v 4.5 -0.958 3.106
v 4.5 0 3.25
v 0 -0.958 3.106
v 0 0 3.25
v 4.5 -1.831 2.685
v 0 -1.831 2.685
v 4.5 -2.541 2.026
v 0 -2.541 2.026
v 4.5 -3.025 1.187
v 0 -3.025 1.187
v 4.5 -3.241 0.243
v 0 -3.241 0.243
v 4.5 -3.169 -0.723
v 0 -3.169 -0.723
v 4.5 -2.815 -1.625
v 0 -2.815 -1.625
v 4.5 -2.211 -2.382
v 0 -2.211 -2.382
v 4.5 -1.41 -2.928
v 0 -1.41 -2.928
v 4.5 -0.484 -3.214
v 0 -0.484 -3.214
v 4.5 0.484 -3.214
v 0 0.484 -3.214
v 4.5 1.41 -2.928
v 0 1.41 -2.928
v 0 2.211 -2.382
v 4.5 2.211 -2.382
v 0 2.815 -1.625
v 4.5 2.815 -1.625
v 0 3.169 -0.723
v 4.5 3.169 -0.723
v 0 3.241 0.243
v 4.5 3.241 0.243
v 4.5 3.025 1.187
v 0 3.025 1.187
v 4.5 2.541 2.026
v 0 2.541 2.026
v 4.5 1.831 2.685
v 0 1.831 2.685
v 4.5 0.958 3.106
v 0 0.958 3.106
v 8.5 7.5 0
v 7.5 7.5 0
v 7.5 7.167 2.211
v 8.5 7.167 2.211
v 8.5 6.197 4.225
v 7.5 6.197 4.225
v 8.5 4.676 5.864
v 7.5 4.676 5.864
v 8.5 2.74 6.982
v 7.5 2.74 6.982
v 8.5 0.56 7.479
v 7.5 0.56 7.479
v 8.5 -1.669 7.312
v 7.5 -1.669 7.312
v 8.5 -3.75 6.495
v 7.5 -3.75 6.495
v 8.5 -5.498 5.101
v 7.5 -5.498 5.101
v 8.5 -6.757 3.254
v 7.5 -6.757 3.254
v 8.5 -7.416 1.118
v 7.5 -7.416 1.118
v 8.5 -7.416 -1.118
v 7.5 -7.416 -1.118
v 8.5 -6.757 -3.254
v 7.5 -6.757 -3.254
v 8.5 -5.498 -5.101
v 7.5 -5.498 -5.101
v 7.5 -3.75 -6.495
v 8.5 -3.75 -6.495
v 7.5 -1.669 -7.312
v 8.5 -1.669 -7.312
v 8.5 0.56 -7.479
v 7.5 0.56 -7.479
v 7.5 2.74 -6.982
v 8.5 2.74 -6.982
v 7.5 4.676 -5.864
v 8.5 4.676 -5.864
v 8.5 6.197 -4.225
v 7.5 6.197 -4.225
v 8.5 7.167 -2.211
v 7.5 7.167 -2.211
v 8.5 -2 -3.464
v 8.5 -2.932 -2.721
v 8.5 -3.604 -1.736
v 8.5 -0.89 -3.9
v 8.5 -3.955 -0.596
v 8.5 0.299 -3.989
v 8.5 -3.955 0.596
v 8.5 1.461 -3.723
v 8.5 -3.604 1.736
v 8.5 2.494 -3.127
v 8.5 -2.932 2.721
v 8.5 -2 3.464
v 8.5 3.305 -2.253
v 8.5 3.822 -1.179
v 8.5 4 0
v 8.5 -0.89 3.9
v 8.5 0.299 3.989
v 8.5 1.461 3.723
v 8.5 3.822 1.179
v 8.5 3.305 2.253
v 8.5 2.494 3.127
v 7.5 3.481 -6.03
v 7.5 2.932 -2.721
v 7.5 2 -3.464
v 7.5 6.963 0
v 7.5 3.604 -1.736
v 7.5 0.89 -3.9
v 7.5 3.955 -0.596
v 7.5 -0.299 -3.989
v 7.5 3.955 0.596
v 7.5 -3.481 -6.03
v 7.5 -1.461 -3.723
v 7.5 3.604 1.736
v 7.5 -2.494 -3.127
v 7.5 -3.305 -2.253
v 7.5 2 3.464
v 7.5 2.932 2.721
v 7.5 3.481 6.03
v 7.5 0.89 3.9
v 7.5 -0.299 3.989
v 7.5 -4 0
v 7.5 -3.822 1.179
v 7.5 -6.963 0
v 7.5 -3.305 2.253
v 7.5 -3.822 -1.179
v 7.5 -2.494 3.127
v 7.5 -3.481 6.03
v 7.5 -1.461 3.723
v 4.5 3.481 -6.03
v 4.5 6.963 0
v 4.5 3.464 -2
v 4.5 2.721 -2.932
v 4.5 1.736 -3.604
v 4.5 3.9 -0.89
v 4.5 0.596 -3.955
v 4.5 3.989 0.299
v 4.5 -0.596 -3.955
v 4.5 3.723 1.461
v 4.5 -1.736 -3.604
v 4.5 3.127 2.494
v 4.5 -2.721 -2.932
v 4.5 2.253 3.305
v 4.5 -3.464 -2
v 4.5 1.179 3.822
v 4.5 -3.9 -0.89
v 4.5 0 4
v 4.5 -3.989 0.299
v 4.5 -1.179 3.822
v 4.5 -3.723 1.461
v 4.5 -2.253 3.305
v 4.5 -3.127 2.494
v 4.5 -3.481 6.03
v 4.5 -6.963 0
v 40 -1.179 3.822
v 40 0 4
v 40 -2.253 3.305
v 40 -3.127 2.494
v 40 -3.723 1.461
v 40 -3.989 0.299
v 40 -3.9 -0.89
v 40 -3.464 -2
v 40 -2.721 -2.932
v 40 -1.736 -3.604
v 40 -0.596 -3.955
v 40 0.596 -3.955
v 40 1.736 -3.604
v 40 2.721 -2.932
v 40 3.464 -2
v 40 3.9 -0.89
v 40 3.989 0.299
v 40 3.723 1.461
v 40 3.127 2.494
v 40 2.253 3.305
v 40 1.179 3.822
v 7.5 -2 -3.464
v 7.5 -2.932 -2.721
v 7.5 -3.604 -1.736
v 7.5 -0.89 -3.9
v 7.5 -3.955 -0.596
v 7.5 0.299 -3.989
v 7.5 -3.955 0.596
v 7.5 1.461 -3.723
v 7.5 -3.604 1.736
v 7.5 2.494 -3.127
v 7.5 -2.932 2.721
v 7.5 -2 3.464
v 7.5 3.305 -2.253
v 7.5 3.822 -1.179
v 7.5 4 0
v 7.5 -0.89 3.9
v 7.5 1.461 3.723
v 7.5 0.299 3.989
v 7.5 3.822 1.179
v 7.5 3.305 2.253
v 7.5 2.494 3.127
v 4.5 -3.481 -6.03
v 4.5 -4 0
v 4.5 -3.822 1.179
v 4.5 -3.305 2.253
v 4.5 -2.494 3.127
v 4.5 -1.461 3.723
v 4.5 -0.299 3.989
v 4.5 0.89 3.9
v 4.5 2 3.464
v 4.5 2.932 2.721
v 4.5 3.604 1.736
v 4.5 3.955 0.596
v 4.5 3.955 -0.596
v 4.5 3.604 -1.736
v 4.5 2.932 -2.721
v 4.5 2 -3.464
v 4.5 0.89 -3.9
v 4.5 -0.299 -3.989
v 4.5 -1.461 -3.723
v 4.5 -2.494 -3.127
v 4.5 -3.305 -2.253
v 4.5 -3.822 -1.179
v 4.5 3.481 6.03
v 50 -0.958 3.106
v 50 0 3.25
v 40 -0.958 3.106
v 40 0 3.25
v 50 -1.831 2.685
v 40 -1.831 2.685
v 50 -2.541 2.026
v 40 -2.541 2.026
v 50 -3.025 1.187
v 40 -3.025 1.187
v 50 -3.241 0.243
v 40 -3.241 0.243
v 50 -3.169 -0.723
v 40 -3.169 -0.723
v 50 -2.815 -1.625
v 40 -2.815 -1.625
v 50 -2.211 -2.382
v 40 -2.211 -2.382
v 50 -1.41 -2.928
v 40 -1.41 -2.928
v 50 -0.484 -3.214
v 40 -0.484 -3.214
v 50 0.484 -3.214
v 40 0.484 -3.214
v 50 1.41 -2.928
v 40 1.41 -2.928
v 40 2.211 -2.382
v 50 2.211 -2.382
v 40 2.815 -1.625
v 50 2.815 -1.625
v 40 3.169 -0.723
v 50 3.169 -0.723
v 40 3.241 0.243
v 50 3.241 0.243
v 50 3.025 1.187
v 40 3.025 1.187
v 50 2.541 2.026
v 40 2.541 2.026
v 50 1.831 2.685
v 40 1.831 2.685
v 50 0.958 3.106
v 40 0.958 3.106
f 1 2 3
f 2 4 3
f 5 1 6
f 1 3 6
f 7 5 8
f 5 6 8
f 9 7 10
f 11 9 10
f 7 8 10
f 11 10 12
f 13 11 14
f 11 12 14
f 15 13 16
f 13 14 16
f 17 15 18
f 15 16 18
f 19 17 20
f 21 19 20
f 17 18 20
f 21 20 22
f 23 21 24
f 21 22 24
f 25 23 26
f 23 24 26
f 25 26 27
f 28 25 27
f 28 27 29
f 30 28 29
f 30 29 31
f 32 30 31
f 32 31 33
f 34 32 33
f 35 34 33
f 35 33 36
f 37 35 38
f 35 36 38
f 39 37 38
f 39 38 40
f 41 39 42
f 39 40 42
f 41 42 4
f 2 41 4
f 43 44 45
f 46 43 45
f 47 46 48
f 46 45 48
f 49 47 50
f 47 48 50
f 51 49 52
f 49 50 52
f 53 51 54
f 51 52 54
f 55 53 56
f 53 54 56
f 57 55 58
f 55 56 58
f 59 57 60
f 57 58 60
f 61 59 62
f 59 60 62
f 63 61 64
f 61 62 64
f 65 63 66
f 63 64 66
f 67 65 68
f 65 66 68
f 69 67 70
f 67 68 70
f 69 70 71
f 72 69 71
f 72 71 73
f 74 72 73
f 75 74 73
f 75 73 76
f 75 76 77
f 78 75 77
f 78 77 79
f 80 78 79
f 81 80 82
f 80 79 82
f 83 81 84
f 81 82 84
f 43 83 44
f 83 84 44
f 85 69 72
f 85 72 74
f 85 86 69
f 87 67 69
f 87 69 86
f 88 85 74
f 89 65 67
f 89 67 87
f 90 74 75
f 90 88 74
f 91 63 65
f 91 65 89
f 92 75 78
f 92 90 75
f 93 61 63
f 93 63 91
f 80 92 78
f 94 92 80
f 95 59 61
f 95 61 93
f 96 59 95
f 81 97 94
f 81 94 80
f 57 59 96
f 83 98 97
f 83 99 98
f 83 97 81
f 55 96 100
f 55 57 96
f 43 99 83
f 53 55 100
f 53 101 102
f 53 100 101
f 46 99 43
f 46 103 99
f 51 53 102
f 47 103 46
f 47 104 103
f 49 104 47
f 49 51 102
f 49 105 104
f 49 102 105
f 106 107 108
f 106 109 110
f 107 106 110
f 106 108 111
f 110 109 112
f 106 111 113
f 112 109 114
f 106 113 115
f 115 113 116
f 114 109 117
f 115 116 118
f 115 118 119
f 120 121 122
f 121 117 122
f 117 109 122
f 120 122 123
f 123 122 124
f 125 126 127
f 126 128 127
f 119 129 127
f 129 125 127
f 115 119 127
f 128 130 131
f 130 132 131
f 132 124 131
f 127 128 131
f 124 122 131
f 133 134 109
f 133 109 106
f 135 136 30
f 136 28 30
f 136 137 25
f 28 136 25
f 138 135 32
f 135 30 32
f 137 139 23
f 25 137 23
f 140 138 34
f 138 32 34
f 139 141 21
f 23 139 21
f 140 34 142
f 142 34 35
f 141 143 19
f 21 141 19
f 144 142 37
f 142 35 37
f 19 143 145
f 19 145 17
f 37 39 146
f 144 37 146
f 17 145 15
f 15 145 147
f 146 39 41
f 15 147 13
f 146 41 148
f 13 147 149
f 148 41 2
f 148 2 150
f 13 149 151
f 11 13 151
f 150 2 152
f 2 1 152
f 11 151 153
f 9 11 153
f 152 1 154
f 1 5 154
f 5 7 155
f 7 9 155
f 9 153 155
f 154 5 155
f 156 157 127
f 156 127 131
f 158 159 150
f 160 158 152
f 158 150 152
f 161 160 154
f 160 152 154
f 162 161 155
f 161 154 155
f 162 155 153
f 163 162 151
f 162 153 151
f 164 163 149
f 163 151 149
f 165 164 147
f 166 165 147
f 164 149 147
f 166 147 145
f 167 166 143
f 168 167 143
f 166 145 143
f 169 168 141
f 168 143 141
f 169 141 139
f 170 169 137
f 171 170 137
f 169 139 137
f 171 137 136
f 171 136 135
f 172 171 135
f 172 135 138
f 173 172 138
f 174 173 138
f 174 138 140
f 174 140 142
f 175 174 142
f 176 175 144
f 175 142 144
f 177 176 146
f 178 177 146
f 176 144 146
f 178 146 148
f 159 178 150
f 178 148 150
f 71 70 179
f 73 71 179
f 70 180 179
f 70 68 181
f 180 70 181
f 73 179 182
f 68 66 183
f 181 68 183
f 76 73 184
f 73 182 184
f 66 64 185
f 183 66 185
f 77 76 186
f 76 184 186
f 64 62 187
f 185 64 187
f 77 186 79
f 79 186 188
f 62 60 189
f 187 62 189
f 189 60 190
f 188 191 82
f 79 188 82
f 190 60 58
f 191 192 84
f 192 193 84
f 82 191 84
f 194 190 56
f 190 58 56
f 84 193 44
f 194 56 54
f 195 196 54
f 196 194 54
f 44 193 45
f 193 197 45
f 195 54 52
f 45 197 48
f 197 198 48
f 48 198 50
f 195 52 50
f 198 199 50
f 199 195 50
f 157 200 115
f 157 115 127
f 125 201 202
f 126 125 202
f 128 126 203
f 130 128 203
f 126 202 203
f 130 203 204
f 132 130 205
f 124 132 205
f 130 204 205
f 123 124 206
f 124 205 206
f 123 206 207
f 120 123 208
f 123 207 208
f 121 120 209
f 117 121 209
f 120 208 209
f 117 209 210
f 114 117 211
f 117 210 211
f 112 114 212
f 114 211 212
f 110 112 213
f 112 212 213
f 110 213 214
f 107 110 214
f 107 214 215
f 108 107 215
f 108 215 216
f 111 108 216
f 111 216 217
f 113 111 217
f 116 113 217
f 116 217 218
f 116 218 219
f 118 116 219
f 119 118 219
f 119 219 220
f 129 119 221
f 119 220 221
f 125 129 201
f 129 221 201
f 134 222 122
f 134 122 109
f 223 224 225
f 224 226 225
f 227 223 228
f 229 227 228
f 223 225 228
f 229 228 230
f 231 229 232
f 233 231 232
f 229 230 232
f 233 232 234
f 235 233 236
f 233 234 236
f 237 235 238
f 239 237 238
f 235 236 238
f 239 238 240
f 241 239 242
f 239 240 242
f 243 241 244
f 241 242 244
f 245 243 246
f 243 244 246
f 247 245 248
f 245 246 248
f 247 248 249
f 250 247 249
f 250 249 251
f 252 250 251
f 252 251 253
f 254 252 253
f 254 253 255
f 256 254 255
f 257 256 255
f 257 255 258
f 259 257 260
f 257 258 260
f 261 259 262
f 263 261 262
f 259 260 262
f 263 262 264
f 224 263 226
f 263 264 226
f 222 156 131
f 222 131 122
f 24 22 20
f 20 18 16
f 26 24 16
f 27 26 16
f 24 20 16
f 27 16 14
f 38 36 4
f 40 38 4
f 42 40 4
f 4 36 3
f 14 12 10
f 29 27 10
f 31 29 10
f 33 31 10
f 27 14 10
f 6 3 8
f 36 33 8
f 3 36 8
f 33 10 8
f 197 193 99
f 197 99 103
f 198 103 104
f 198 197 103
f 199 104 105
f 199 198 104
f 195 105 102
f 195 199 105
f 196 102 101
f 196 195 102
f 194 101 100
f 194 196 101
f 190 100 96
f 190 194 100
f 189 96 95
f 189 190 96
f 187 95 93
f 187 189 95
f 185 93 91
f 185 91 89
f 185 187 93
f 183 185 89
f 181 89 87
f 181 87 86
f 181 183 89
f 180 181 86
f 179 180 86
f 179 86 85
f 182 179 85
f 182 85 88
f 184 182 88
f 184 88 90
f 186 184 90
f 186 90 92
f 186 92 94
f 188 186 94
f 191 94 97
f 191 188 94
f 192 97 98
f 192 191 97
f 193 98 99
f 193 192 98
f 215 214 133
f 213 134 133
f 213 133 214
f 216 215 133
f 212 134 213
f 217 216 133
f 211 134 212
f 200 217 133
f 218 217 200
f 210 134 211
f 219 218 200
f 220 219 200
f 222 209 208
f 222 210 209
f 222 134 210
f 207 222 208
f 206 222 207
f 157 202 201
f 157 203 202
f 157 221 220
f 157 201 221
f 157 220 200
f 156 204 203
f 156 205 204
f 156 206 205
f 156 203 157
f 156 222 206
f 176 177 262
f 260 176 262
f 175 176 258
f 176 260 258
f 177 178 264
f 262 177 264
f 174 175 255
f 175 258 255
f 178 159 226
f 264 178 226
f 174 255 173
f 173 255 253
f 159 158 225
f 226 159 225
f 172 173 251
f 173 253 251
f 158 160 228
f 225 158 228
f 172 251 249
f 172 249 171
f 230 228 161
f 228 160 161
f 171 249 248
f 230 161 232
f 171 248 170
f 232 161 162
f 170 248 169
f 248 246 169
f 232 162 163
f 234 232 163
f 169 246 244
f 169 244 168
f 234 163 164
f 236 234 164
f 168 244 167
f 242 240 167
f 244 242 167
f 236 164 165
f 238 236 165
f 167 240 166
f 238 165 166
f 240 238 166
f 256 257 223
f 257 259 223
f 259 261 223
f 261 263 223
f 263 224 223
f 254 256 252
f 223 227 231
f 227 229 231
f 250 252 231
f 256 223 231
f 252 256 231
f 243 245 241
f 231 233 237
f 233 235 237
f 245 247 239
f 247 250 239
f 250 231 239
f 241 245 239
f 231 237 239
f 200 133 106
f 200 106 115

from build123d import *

# Parameters (mm, degrees)
F2_R     = 4
F3_DEPTH = 3
F4_R     = 7.5
F4_R_2   = 4
F5_DEPTH = 1


with BuildPart() as f1:
    # F0 (on Front) → F1 (revolve)
    with BuildSketch(Plane.XZ):
        Polygon((0, 3.25), (0, 0), (50, 0), (50, 3.25), (40, 3.25), (40, 4), (4.5, 4), (4.5, 3.25), align=None)
    revolve(axis=Axis((25, 0, 0), (1, 0, 0)))


with BuildPart() as f3:
    # F2 (on face) → F3 (new body)
    with BuildSketch(Plane(origin=(4.5, 0, 0), x_dir=(0, -1, 0), z_dir=(-1, 0, 0))):
        Polygon((3.481422, 6.03), (-3.481422, 6.03), (-6.962844, 0), (-3.481422, -6.03), (3.481422, -6.03), (6.962844, 0), align=None)
        Circle(F2_R, mode=Mode.SUBTRACT)
    extrude(amount=-F3_DEPTH)


with BuildPart() as f5:
    # F4 (on face) → F5 (new body)
    with BuildSketch(Plane.YZ.offset(7.5)):
        Circle(F4_R)
        Circle(F4_R_2, mode=Mode.SUBTRACT)
    extrude(amount=F5_DEPTH)


solid = Compound([f1.part, f3.part, f5.part])
